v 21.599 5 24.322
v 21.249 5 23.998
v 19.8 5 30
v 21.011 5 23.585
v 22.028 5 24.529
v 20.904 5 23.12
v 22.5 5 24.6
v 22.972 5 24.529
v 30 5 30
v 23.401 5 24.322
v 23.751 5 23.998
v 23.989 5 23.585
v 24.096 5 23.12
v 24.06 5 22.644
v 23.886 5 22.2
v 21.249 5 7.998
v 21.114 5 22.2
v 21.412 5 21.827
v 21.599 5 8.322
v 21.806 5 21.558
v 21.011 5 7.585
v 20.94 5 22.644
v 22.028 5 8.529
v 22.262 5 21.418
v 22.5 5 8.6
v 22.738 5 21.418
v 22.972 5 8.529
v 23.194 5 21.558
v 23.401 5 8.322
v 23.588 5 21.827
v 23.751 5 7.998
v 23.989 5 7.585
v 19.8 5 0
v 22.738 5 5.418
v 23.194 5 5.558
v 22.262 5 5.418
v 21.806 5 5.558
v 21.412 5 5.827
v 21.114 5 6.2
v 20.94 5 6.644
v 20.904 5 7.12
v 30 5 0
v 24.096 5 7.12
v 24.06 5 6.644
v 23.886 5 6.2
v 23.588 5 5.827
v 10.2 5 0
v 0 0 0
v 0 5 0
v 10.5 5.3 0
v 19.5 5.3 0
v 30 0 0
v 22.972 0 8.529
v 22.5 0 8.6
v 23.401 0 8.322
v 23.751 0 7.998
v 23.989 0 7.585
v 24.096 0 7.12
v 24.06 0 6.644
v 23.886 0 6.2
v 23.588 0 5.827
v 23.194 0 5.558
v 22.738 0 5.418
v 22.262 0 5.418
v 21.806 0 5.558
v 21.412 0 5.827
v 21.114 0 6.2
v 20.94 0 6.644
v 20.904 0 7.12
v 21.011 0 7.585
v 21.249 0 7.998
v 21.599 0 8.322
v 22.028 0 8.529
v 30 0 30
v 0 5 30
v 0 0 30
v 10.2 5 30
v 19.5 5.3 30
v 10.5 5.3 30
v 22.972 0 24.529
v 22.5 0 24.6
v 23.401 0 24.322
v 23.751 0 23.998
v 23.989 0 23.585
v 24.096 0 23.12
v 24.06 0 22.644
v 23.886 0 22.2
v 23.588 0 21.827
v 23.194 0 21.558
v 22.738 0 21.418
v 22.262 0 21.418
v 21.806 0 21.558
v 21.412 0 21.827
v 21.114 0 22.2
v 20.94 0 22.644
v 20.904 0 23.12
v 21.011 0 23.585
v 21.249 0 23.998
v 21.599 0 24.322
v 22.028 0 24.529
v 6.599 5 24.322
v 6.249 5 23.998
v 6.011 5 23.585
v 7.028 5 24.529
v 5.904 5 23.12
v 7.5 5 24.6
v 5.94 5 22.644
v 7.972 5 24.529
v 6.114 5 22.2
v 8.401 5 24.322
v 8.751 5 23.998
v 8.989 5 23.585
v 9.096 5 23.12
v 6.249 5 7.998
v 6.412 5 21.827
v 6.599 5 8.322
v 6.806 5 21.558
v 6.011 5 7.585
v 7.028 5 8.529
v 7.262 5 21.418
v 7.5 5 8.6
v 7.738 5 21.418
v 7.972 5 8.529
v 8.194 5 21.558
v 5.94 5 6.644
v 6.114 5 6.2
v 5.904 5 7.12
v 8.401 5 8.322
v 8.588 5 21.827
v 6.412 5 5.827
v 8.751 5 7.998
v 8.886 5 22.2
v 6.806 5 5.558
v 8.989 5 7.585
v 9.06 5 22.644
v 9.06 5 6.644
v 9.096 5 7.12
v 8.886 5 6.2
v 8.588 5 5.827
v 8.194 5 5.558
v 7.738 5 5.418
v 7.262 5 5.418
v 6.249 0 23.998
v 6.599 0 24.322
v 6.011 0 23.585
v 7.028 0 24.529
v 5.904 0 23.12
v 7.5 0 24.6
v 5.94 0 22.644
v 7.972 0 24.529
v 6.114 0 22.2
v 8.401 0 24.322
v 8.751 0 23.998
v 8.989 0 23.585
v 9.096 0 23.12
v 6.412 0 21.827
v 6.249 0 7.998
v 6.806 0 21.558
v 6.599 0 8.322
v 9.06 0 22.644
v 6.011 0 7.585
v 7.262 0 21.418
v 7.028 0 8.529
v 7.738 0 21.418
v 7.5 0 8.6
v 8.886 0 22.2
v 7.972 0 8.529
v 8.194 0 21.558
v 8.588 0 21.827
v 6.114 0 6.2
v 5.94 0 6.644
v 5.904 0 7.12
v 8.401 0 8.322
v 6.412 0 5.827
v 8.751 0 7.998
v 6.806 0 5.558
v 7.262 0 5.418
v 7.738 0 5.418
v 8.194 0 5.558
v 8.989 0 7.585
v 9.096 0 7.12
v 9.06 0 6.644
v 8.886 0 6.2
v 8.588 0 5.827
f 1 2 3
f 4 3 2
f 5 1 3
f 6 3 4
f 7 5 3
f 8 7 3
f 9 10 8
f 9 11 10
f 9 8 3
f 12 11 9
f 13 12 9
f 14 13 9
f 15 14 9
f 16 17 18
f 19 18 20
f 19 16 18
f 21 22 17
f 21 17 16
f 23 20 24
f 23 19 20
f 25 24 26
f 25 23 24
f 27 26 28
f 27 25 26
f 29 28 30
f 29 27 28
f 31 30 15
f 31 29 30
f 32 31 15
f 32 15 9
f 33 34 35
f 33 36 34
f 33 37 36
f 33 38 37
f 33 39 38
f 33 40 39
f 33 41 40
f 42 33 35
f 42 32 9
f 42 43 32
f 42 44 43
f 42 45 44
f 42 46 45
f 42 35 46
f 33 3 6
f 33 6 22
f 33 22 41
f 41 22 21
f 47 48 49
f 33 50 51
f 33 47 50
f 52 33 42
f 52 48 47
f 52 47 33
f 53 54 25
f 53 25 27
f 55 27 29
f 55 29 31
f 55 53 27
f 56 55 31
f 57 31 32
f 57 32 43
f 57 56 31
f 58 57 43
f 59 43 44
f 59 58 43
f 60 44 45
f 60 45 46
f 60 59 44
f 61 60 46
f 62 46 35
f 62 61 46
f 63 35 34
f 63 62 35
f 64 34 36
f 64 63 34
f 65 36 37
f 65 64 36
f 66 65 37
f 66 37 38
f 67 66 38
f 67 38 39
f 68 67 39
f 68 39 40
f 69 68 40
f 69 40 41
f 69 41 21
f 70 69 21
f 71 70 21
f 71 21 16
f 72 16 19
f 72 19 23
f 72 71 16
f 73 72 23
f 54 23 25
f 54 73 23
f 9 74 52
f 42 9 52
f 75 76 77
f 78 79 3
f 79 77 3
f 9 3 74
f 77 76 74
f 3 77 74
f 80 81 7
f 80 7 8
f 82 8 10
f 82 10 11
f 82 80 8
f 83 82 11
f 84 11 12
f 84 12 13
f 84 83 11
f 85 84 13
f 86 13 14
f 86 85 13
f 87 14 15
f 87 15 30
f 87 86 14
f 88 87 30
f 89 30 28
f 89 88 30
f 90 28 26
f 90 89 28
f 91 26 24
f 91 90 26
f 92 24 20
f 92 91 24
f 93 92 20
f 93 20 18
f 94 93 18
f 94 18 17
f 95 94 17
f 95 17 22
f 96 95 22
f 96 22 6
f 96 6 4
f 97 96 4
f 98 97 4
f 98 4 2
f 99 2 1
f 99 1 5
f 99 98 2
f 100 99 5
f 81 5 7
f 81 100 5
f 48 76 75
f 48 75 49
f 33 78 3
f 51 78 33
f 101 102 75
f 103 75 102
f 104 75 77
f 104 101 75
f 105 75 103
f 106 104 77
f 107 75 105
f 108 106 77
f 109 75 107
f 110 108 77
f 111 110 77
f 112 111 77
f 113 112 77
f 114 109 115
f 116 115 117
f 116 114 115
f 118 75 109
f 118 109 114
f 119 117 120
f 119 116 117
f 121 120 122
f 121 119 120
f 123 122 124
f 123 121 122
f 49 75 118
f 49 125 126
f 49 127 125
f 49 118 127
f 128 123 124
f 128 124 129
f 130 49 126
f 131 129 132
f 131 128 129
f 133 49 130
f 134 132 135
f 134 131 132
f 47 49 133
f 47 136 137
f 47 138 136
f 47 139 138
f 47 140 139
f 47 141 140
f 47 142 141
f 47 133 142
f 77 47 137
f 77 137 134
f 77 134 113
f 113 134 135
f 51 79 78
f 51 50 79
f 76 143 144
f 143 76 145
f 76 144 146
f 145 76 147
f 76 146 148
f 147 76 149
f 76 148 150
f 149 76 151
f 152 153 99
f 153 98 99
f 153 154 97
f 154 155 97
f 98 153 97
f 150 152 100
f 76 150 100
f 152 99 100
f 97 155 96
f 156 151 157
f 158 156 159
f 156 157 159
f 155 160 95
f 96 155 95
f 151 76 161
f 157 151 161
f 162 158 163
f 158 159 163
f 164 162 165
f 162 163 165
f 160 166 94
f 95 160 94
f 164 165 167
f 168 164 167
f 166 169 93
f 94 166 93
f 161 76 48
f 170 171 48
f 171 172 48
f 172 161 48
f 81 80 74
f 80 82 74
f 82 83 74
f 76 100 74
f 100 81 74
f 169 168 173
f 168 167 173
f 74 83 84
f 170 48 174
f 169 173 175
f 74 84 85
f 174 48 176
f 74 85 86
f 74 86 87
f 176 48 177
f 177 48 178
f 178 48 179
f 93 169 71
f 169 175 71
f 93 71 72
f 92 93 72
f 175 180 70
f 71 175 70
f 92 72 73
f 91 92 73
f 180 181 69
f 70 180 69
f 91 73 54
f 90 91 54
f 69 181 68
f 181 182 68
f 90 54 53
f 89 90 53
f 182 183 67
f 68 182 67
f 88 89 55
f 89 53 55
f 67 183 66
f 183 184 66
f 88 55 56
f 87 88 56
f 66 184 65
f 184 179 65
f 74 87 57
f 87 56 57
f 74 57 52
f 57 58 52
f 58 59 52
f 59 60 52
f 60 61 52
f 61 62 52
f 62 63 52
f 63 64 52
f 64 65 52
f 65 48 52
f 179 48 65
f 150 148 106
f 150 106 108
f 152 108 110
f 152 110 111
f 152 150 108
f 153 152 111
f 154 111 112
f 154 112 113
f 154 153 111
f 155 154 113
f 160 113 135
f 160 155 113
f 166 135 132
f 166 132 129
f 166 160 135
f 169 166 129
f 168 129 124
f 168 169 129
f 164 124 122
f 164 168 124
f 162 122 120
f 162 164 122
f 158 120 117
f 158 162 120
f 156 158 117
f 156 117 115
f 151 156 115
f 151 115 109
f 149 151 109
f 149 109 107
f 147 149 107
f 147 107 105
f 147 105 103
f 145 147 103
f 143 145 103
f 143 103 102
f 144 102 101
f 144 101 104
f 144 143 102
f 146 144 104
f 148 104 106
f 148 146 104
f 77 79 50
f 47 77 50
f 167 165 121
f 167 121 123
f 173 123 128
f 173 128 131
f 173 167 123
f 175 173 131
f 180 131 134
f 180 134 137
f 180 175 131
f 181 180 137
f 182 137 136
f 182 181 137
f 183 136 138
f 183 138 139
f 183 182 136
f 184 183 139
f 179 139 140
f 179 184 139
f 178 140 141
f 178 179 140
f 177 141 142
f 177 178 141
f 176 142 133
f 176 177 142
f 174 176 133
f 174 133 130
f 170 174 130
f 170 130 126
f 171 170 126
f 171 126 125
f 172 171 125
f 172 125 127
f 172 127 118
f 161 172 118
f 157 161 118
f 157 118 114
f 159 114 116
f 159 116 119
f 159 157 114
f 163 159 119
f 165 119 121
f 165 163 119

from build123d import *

# Parameters (mm, degrees)
SKETCH_1_W      = 30
SKETCH_1_H      = 30
SKETCH_1_R      = 1.6
EXTRUDE_1_DEPTH = 5
SKETCH_2_W      = 9.6
SKETCH_2_H      = 30
EXTRUDE_2_DEPTH = 0.3
CHAMFER_2_SIZE  = 0.3


with BuildPart() as part:
    # 草图1 → 凸台-拉伸1 (new body)
    with BuildSketch(Plane(origin=(0, 0, 0), x_dir=(1, 0, 0), z_dir=(0, 1, 0))):
        with Locations((15, -15)):
            Rectangle(SKETCH_1_W, SKETCH_1_H)
        with Locations(Location((7.5, -7, 0), (0, 0, 270))):
            Circle(SKETCH_1_R, mode=Mode.SUBTRACT)
        with Locations(Location((22.5, -7, 0), (0, 0, 270))):
            Circle(SKETCH_1_R, mode=Mode.SUBTRACT)
        with Locations(Location((22.5, -23, 0), (0, 0, 270))):
            Circle(SKETCH_1_R, mode=Mode.SUBTRACT)
        with Locations(Location((7.5, -23, 0), (0, 0, 270))):
            Circle(SKETCH_1_R, mode=Mode.SUBTRACT)
    extrude(amount=EXTRUDE_1_DEPTH)

    # 草图2 → 凸台-拉伸2 (add)
    with BuildSketch(Plane(origin=(0, 5, 0), x_dir=(1, 0, 0), z_dir=(0, 1, 0))):
        with Locations((15, -15)):
            Rectangle(SKETCH_2_W, SKETCH_2_H)
    extrude(amount=EXTRUDE_2_DEPTH)

    # 倒角2
    chamfer_2_edges = [part.edges().sort_by_distance(p)[0] for p in [
        (19.8, 5.3, 15),
        (10.2, 5.3, 15),
    ]]
    chamfer(chamfer_2_edges, length=CHAMFER_2_SIZE - 0.0001)  # a hair under: the kernel refuses the full size


solid = part.part
